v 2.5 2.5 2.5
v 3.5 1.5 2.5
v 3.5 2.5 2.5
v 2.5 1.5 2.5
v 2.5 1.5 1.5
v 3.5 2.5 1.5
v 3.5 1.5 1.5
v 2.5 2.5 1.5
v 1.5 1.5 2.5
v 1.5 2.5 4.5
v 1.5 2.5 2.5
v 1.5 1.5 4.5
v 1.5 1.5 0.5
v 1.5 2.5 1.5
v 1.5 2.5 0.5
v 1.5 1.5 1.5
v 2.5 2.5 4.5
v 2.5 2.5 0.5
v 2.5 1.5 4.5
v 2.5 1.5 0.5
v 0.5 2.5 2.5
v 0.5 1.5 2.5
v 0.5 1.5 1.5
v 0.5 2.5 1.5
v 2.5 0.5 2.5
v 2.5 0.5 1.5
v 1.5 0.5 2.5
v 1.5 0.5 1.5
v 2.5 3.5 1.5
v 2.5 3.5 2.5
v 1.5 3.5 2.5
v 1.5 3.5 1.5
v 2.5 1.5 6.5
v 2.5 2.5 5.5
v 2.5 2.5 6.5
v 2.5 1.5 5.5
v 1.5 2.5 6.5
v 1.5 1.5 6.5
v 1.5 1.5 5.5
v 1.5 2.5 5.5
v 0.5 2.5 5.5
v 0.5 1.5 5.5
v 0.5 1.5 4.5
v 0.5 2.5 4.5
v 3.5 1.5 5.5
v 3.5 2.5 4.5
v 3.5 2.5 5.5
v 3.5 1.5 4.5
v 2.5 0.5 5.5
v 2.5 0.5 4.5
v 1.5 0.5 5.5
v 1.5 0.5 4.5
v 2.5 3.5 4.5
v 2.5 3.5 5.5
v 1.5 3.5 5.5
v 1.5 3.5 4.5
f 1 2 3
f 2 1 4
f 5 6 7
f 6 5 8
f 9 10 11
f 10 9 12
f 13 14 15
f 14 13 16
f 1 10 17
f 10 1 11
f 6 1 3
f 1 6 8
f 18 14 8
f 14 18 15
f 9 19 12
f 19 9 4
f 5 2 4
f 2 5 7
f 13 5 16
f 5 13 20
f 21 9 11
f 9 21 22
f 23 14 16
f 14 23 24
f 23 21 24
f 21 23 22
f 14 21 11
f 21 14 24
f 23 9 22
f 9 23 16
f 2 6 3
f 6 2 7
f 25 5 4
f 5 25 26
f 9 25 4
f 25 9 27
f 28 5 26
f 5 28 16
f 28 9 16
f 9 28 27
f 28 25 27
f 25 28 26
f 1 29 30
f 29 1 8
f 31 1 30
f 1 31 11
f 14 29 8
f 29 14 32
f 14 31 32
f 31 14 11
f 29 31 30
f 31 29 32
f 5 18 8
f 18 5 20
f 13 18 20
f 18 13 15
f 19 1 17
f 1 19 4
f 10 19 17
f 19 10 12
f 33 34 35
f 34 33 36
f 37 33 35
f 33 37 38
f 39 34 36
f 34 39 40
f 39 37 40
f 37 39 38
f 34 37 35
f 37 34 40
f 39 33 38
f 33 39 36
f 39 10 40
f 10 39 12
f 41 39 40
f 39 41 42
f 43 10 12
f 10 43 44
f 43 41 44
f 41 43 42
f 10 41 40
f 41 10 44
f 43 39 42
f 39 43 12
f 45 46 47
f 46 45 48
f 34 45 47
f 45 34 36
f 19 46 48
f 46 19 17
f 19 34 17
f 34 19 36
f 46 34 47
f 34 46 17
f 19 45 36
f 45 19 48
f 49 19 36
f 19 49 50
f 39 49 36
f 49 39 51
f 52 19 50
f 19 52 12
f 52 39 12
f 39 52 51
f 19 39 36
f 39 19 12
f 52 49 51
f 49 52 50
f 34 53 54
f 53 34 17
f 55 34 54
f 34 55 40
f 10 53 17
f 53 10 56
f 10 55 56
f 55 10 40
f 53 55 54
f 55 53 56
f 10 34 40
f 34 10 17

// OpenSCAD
module Droplet() {
	translate([2,2,2])
		cube([1,1,1],true);
	translate([1,2,2])
		cube([1,1,1],true);
	translate([3,2,2])
		cube([1,1,1],true);
	translate([2,1,2])
		cube([1,1,1],true);
	translate([2,3,2])
		cube([1,1,1],true);
	translate([2,2,1])
		cube([1,1,1],true);
	translate([2,2,3])
		cube([1,1,1],true);
	translate([2,2,4])
		cube([1,1,1],true);
	translate([2,2,6])
		cube([1,1,1],true);
	translate([1,2,5])
		cube([1,1,1],true);
	translate([3,2,5])
		cube([1,1,1],true);
	translate([2,1,5])
		cube([1,1,1],true);
	translate([2,3,5])
		cube([1,1,1],true);
}
Droplet();
